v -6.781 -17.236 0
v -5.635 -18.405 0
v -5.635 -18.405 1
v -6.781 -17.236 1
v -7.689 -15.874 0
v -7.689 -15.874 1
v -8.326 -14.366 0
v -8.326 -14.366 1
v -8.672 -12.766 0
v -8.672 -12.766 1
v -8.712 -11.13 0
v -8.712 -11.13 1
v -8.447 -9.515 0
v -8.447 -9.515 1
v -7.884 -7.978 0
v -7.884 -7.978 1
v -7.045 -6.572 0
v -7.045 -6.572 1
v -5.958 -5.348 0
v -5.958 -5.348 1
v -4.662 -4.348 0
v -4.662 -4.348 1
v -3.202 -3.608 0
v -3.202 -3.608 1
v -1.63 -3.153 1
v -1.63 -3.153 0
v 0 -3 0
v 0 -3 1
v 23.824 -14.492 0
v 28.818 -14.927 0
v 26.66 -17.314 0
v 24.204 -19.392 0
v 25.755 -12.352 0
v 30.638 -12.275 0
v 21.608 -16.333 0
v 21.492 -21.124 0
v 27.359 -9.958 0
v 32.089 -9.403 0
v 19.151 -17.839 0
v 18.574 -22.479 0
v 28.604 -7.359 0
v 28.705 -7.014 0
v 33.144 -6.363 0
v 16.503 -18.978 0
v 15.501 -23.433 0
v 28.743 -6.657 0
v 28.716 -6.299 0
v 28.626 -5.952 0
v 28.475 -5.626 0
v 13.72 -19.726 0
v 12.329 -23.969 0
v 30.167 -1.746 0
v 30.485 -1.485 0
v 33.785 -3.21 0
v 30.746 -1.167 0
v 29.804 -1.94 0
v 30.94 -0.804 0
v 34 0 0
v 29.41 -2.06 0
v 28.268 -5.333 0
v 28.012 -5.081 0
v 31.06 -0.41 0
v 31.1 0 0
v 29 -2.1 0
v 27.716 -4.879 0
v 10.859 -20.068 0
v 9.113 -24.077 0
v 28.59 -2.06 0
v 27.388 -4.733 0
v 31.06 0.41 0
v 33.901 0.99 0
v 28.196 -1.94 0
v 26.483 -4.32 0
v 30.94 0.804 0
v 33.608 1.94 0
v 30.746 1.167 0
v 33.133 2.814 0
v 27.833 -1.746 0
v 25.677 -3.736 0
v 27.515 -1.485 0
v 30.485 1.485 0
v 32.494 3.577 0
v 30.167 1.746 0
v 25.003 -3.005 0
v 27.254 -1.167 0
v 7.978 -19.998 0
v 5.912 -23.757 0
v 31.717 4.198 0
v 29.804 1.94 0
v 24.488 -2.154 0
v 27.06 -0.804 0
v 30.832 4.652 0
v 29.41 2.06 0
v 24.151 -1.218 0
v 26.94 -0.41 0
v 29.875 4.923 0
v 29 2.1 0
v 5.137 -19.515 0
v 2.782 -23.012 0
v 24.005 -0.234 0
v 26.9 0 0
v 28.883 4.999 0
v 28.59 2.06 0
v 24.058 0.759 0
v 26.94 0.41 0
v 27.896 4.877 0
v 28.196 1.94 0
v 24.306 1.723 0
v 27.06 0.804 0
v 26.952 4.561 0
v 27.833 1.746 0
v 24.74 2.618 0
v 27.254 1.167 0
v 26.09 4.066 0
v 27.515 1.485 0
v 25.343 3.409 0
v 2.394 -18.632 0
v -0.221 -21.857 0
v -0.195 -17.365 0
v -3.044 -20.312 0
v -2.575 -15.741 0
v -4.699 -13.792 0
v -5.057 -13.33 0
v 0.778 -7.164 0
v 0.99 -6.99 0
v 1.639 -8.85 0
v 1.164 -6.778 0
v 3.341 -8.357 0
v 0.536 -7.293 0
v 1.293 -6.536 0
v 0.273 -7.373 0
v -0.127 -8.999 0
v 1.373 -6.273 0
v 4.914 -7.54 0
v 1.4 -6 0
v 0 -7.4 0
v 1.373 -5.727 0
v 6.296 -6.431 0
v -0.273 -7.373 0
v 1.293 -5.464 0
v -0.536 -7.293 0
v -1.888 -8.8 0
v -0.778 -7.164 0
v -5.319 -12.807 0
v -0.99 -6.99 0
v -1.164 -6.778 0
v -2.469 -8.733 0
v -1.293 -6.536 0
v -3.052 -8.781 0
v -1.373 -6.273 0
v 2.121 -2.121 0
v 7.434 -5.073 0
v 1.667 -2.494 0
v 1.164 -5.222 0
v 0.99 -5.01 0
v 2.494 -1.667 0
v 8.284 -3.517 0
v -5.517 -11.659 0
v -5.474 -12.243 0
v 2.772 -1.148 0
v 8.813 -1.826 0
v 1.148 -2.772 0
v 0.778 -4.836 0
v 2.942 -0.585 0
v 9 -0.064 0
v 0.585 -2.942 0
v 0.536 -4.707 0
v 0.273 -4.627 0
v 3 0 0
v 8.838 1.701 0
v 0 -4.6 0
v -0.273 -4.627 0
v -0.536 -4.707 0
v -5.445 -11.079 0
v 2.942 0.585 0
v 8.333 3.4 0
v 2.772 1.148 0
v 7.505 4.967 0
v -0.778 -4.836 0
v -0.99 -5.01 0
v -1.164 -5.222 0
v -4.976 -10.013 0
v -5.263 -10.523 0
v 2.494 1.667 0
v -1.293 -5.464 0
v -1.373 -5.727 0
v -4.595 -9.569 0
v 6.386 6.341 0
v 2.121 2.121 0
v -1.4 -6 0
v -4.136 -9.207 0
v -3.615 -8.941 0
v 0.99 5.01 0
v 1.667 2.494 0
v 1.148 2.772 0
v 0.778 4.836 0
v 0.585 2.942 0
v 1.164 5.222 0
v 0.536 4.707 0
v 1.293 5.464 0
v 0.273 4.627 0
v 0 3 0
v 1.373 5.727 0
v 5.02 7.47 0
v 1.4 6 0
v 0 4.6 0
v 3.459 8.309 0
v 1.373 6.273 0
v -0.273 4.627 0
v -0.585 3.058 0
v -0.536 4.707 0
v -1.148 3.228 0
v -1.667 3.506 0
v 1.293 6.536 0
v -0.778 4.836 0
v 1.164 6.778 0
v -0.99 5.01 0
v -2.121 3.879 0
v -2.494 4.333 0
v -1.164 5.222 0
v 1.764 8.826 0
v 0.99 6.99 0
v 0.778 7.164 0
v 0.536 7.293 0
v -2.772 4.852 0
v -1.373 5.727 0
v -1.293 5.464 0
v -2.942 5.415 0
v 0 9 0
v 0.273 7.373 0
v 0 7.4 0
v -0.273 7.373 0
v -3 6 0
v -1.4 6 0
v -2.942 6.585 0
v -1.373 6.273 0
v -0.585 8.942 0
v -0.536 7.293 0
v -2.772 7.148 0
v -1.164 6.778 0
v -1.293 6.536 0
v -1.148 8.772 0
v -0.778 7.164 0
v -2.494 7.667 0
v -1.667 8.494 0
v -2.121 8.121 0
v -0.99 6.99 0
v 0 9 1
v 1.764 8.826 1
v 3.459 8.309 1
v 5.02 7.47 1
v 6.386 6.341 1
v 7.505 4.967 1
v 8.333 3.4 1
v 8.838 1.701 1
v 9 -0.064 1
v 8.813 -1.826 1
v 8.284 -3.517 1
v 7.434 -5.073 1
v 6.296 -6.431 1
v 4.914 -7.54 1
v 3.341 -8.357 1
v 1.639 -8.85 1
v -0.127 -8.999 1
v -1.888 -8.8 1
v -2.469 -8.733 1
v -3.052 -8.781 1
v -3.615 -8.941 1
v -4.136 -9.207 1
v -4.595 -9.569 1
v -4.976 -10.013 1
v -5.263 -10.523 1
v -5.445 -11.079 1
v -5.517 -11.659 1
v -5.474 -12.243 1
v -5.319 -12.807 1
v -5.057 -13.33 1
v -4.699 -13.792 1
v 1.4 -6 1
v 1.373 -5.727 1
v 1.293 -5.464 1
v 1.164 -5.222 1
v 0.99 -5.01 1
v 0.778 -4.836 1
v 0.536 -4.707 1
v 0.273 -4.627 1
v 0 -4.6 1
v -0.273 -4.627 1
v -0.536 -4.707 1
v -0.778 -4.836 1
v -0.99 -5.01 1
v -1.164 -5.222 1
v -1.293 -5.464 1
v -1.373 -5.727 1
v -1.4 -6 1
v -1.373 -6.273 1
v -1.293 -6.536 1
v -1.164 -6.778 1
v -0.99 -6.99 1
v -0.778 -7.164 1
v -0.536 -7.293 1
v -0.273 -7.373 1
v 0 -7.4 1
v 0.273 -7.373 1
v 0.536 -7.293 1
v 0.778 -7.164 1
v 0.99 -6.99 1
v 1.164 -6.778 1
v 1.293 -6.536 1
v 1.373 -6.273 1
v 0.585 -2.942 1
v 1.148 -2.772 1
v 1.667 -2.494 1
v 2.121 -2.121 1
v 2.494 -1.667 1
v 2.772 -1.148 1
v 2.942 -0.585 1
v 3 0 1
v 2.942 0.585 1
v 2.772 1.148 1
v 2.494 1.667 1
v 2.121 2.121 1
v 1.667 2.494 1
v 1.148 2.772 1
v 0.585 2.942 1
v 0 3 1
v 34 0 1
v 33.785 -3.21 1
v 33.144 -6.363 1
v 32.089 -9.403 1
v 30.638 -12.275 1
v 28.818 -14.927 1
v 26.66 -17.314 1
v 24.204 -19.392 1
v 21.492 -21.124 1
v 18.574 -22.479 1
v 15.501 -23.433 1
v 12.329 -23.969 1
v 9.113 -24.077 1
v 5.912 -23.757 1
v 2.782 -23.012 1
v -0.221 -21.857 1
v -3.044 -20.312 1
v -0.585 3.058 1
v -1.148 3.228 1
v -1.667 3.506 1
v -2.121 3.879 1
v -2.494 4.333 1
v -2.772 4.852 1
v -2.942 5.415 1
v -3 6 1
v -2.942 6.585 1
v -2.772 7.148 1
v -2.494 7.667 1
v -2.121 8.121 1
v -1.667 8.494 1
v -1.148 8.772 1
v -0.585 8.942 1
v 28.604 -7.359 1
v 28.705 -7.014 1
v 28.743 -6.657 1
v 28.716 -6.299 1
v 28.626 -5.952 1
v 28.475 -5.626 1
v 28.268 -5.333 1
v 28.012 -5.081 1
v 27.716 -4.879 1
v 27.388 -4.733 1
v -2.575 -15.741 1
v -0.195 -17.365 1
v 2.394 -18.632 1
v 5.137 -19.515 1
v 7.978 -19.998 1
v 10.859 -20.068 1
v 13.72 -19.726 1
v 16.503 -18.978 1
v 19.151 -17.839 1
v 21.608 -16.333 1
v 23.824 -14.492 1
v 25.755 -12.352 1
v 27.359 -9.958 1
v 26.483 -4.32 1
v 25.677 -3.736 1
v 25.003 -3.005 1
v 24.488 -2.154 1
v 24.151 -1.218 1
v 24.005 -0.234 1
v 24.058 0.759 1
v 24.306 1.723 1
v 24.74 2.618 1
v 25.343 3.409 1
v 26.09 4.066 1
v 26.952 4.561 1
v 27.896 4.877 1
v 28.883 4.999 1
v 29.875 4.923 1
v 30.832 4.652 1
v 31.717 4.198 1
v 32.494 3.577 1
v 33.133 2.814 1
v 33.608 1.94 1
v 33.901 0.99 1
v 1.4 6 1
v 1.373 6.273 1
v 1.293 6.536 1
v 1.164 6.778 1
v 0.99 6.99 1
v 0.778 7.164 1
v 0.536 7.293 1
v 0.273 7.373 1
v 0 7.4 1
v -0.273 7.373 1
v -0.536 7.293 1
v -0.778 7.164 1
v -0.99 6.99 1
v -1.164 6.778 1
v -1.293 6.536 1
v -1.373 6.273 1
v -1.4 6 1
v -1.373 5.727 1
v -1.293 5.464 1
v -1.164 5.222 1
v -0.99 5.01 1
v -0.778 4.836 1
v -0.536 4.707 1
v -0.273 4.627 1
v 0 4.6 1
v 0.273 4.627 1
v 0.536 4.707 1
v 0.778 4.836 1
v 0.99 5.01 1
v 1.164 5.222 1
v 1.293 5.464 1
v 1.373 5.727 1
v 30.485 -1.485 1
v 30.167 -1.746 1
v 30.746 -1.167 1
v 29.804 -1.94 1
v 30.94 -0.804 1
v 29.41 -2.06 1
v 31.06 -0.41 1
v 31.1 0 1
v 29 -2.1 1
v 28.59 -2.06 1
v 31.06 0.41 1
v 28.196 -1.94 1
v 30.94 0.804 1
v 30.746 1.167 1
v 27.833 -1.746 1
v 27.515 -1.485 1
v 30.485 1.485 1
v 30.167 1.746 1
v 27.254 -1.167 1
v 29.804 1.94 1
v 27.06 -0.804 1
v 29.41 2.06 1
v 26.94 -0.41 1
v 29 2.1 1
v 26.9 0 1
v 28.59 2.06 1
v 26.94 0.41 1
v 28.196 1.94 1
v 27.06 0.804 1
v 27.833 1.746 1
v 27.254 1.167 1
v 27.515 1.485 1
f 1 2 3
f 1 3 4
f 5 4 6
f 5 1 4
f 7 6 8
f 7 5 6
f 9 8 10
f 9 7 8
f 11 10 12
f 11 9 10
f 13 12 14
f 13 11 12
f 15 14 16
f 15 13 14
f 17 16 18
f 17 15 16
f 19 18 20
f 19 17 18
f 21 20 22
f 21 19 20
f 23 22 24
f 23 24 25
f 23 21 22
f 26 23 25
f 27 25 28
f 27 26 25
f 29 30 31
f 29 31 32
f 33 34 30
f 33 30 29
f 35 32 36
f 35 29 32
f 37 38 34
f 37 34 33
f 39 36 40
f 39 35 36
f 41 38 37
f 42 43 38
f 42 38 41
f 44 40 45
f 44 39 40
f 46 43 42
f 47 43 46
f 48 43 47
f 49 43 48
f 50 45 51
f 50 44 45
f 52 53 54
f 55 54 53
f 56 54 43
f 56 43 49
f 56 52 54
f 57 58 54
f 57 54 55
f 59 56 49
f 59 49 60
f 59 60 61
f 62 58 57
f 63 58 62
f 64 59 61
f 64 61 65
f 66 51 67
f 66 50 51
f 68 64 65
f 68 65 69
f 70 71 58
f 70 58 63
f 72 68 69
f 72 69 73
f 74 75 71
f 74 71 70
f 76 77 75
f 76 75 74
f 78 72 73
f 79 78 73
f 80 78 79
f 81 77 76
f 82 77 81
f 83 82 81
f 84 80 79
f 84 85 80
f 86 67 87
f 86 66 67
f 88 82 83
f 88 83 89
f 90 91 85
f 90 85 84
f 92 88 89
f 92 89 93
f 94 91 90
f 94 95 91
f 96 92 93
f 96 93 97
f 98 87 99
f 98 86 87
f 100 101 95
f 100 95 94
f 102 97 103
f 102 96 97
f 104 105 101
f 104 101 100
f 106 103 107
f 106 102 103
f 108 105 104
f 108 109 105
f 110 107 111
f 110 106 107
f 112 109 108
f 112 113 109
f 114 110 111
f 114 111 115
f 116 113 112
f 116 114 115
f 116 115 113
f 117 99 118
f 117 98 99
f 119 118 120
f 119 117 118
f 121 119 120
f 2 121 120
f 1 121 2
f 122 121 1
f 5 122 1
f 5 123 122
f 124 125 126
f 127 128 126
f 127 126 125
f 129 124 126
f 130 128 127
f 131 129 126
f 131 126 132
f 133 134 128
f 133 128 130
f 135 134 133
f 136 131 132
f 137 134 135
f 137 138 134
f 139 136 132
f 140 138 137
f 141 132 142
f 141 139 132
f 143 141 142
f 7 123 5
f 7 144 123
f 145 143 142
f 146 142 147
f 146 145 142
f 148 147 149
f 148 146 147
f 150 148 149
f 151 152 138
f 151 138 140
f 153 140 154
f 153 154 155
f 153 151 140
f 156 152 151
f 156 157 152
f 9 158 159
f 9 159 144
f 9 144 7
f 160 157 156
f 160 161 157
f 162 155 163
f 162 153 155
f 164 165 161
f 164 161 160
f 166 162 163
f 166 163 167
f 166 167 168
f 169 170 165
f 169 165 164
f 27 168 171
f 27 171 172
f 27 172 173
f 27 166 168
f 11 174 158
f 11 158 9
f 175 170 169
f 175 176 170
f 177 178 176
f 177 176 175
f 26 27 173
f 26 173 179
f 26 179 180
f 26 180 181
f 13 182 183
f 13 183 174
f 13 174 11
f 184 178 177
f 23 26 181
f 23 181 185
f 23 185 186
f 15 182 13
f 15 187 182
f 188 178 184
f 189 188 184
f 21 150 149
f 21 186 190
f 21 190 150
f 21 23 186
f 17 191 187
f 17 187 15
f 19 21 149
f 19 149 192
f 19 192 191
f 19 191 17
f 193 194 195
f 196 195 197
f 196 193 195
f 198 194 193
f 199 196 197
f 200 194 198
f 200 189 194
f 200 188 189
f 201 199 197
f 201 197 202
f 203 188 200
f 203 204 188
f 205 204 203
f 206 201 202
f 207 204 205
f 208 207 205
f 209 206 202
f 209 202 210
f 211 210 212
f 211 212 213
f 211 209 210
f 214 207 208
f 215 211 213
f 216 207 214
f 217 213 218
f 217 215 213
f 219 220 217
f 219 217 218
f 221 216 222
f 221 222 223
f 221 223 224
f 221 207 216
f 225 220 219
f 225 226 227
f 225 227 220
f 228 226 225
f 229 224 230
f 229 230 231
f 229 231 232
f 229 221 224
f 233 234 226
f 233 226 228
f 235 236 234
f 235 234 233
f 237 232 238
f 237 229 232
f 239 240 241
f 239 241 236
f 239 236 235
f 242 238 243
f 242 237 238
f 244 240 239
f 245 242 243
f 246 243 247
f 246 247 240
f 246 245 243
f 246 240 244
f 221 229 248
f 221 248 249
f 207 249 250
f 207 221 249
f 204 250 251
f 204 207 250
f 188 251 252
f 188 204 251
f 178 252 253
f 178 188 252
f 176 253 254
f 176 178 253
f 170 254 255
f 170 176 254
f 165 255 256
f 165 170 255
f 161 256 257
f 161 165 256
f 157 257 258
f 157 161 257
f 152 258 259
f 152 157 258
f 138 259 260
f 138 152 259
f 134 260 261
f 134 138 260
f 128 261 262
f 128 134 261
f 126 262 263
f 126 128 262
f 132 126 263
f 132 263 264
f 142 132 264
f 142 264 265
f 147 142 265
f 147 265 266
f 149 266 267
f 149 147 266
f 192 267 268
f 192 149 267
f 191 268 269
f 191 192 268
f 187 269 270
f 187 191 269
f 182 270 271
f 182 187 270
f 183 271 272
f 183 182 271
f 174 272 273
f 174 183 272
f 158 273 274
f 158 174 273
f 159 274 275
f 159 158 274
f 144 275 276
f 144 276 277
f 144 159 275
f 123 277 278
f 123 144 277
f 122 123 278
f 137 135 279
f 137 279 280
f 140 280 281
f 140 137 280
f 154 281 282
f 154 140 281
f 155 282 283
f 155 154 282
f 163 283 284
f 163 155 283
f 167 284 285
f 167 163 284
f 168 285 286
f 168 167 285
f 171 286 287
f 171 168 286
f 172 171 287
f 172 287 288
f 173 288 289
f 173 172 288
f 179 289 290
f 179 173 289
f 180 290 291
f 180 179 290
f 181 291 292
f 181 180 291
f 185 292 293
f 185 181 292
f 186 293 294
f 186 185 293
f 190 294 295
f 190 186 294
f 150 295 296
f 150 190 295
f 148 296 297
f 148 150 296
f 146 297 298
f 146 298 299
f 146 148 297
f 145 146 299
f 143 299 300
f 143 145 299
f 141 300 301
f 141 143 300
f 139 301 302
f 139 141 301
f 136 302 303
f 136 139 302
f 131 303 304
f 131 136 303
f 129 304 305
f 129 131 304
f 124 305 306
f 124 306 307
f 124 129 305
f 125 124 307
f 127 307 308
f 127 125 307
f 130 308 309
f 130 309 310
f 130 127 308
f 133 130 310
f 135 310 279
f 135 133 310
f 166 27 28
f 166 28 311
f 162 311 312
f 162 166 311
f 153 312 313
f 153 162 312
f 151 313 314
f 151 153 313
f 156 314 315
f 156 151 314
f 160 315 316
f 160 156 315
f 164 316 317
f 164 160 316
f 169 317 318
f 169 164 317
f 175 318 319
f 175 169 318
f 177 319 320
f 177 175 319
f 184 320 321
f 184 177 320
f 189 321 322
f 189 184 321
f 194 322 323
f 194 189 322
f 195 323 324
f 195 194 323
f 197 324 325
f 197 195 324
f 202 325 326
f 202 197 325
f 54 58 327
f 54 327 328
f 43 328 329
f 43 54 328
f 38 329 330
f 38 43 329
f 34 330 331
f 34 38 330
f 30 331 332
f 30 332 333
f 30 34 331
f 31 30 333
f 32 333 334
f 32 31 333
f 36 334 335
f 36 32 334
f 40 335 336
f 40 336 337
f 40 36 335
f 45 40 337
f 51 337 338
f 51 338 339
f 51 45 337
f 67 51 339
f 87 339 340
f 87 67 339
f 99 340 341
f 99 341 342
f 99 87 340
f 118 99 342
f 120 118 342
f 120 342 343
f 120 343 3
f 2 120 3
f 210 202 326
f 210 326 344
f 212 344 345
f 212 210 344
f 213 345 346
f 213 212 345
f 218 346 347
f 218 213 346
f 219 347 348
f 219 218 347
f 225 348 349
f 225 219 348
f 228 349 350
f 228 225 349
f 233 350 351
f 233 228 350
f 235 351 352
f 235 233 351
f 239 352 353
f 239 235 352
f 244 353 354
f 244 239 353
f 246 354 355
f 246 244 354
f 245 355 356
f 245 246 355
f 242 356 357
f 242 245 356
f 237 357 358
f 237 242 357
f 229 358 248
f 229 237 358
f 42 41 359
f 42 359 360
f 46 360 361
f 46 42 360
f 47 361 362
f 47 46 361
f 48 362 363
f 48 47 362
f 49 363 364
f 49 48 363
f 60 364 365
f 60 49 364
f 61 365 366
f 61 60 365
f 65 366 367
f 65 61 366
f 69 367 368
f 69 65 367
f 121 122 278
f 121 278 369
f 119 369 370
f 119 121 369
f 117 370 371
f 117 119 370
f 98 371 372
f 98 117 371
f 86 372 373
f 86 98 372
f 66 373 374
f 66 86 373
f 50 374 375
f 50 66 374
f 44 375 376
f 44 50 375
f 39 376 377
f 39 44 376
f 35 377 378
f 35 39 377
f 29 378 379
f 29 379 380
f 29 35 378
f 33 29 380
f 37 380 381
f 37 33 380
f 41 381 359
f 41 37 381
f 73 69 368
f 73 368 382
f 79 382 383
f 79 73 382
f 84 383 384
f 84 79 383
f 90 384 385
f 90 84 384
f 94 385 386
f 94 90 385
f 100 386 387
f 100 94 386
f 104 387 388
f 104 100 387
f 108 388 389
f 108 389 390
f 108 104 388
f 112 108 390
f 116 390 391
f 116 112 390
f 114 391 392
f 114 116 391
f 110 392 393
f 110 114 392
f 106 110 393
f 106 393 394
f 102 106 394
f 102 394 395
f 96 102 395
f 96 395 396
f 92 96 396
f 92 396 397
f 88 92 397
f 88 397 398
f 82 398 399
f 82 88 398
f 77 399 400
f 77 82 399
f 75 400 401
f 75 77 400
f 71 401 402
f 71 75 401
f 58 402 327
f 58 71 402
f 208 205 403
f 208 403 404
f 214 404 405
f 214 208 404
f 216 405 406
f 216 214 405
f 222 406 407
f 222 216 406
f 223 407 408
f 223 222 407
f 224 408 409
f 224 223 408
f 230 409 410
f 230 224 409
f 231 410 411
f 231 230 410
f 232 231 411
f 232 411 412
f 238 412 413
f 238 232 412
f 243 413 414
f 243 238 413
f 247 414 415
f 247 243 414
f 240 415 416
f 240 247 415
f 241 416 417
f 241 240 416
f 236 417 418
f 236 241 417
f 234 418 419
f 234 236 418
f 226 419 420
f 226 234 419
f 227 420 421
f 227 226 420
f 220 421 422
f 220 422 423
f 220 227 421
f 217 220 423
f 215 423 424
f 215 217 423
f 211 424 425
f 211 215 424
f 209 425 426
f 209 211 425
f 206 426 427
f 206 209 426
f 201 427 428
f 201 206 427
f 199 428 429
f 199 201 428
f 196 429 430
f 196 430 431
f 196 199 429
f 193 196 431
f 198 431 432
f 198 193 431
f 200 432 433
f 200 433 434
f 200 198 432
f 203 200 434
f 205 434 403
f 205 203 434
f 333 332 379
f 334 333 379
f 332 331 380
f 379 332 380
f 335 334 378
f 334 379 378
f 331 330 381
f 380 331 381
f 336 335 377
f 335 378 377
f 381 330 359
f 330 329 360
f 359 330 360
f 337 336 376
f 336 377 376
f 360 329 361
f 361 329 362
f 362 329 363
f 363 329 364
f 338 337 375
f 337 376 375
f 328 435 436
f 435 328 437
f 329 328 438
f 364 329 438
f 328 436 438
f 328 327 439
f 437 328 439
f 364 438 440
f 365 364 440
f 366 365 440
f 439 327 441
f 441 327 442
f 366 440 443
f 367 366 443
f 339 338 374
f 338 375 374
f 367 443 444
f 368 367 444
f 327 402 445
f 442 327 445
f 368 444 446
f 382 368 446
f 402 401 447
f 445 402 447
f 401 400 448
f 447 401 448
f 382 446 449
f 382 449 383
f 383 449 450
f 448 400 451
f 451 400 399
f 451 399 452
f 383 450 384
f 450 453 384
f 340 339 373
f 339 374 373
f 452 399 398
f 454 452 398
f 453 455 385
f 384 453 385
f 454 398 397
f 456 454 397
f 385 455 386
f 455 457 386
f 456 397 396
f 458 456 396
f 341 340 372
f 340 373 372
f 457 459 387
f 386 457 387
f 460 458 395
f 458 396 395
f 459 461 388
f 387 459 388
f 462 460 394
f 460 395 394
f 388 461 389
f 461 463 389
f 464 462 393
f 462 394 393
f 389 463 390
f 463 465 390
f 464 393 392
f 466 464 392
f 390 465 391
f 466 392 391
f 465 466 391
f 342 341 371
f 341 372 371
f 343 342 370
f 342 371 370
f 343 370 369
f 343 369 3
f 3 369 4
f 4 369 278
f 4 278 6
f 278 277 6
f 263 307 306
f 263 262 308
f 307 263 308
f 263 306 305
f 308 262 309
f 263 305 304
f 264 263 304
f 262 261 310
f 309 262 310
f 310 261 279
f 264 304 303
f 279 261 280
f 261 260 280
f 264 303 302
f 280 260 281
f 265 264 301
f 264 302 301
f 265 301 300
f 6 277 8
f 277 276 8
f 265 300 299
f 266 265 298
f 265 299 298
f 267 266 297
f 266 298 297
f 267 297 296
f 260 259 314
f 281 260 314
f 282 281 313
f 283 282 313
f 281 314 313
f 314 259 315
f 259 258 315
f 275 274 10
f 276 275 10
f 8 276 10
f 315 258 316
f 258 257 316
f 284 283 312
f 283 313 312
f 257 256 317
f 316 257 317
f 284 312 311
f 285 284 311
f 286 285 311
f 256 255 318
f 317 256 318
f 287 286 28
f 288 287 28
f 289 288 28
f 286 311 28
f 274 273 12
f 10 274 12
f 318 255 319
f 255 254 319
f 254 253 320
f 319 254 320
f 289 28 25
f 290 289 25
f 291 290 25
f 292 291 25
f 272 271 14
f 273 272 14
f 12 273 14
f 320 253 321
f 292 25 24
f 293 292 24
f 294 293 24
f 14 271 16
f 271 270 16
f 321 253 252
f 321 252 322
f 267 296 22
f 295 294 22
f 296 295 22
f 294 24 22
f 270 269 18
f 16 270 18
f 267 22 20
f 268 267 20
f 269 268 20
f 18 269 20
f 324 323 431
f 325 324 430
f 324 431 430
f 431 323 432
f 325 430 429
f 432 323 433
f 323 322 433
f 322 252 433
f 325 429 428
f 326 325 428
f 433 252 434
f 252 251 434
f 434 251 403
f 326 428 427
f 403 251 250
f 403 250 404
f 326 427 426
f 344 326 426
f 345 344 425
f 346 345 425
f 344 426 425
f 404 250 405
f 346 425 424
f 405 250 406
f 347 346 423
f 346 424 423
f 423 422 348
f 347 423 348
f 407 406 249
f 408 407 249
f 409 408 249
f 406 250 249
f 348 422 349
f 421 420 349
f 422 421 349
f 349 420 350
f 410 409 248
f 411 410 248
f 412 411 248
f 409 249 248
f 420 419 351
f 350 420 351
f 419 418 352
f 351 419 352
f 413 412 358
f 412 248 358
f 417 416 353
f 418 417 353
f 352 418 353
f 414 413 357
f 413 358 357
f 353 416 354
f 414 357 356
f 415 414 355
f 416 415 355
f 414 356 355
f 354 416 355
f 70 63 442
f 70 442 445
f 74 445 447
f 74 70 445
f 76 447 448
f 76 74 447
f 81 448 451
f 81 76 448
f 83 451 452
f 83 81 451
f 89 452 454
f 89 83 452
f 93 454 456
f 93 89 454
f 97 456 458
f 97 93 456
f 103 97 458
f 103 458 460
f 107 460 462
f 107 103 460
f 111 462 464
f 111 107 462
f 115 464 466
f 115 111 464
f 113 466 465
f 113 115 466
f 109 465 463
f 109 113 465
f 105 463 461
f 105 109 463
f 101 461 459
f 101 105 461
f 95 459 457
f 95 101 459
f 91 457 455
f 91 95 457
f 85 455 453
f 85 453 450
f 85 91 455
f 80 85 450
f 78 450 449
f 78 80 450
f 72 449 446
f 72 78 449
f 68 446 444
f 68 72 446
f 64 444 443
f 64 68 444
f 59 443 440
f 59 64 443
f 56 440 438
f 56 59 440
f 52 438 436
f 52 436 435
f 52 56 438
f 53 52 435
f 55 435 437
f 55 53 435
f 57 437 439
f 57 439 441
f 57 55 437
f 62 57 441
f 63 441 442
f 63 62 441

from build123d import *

# Parameters (mm, degrees)
SKETCH_1_R      = 1.4
SKETCH_1_R_2    = 2.1
EXTRUDE_1_DEPTH = 1


with BuildPart() as part:
    # 草图1 → 凸台-拉伸1 (new body)
    with BuildSketch(Plane.XY):
        with BuildLine():
            ThreePointArc((0, -3), (3, 0), (0, 3))
            ThreePointArc((0, 3), (-3, 6), (0, 9))
            ThreePointArc((0, 9), (8.949788871, -0.94935724), (-1.888121525, -8.79971574))
            ThreePointArc((-1.888121525, -8.79971574), (-5.13171085, -10.261262299), (-4.698844689, -13.792496777))
            ThreePointArc((-4.698844689, -13.792496777), (13.72027933, -19.725875002), (28.603853377, -7.358646923))
            ThreePointArc((28.603853377, -7.358646923), (28.557639821, -5.785568702), (27.387741629, -4.732929637))
            ThreePointArc((27.387741629, -4.732929637), (26.089784532, 4.065789705), (34, 0))
            ThreePointArc((34, 0), (20.055509911, -21.849807636), (-5.63484885, -18.404758393))
            ThreePointArc((-5.63484885, -18.404758393), (-8.201495332, -8.732960074), (0, -3))
        make_face()
        with Locations((0, 6)):
            Circle(SKETCH_1_R, mode=Mode.SUBTRACT)
        with Locations((0, -6)):
            Circle(SKETCH_1_R, mode=Mode.SUBTRACT)
        with Locations((29, 0)):
            Circle(SKETCH_1_R_2, mode=Mode.SUBTRACT)
    extrude(amount=EXTRUDE_1_DEPTH)


solid = part.part
